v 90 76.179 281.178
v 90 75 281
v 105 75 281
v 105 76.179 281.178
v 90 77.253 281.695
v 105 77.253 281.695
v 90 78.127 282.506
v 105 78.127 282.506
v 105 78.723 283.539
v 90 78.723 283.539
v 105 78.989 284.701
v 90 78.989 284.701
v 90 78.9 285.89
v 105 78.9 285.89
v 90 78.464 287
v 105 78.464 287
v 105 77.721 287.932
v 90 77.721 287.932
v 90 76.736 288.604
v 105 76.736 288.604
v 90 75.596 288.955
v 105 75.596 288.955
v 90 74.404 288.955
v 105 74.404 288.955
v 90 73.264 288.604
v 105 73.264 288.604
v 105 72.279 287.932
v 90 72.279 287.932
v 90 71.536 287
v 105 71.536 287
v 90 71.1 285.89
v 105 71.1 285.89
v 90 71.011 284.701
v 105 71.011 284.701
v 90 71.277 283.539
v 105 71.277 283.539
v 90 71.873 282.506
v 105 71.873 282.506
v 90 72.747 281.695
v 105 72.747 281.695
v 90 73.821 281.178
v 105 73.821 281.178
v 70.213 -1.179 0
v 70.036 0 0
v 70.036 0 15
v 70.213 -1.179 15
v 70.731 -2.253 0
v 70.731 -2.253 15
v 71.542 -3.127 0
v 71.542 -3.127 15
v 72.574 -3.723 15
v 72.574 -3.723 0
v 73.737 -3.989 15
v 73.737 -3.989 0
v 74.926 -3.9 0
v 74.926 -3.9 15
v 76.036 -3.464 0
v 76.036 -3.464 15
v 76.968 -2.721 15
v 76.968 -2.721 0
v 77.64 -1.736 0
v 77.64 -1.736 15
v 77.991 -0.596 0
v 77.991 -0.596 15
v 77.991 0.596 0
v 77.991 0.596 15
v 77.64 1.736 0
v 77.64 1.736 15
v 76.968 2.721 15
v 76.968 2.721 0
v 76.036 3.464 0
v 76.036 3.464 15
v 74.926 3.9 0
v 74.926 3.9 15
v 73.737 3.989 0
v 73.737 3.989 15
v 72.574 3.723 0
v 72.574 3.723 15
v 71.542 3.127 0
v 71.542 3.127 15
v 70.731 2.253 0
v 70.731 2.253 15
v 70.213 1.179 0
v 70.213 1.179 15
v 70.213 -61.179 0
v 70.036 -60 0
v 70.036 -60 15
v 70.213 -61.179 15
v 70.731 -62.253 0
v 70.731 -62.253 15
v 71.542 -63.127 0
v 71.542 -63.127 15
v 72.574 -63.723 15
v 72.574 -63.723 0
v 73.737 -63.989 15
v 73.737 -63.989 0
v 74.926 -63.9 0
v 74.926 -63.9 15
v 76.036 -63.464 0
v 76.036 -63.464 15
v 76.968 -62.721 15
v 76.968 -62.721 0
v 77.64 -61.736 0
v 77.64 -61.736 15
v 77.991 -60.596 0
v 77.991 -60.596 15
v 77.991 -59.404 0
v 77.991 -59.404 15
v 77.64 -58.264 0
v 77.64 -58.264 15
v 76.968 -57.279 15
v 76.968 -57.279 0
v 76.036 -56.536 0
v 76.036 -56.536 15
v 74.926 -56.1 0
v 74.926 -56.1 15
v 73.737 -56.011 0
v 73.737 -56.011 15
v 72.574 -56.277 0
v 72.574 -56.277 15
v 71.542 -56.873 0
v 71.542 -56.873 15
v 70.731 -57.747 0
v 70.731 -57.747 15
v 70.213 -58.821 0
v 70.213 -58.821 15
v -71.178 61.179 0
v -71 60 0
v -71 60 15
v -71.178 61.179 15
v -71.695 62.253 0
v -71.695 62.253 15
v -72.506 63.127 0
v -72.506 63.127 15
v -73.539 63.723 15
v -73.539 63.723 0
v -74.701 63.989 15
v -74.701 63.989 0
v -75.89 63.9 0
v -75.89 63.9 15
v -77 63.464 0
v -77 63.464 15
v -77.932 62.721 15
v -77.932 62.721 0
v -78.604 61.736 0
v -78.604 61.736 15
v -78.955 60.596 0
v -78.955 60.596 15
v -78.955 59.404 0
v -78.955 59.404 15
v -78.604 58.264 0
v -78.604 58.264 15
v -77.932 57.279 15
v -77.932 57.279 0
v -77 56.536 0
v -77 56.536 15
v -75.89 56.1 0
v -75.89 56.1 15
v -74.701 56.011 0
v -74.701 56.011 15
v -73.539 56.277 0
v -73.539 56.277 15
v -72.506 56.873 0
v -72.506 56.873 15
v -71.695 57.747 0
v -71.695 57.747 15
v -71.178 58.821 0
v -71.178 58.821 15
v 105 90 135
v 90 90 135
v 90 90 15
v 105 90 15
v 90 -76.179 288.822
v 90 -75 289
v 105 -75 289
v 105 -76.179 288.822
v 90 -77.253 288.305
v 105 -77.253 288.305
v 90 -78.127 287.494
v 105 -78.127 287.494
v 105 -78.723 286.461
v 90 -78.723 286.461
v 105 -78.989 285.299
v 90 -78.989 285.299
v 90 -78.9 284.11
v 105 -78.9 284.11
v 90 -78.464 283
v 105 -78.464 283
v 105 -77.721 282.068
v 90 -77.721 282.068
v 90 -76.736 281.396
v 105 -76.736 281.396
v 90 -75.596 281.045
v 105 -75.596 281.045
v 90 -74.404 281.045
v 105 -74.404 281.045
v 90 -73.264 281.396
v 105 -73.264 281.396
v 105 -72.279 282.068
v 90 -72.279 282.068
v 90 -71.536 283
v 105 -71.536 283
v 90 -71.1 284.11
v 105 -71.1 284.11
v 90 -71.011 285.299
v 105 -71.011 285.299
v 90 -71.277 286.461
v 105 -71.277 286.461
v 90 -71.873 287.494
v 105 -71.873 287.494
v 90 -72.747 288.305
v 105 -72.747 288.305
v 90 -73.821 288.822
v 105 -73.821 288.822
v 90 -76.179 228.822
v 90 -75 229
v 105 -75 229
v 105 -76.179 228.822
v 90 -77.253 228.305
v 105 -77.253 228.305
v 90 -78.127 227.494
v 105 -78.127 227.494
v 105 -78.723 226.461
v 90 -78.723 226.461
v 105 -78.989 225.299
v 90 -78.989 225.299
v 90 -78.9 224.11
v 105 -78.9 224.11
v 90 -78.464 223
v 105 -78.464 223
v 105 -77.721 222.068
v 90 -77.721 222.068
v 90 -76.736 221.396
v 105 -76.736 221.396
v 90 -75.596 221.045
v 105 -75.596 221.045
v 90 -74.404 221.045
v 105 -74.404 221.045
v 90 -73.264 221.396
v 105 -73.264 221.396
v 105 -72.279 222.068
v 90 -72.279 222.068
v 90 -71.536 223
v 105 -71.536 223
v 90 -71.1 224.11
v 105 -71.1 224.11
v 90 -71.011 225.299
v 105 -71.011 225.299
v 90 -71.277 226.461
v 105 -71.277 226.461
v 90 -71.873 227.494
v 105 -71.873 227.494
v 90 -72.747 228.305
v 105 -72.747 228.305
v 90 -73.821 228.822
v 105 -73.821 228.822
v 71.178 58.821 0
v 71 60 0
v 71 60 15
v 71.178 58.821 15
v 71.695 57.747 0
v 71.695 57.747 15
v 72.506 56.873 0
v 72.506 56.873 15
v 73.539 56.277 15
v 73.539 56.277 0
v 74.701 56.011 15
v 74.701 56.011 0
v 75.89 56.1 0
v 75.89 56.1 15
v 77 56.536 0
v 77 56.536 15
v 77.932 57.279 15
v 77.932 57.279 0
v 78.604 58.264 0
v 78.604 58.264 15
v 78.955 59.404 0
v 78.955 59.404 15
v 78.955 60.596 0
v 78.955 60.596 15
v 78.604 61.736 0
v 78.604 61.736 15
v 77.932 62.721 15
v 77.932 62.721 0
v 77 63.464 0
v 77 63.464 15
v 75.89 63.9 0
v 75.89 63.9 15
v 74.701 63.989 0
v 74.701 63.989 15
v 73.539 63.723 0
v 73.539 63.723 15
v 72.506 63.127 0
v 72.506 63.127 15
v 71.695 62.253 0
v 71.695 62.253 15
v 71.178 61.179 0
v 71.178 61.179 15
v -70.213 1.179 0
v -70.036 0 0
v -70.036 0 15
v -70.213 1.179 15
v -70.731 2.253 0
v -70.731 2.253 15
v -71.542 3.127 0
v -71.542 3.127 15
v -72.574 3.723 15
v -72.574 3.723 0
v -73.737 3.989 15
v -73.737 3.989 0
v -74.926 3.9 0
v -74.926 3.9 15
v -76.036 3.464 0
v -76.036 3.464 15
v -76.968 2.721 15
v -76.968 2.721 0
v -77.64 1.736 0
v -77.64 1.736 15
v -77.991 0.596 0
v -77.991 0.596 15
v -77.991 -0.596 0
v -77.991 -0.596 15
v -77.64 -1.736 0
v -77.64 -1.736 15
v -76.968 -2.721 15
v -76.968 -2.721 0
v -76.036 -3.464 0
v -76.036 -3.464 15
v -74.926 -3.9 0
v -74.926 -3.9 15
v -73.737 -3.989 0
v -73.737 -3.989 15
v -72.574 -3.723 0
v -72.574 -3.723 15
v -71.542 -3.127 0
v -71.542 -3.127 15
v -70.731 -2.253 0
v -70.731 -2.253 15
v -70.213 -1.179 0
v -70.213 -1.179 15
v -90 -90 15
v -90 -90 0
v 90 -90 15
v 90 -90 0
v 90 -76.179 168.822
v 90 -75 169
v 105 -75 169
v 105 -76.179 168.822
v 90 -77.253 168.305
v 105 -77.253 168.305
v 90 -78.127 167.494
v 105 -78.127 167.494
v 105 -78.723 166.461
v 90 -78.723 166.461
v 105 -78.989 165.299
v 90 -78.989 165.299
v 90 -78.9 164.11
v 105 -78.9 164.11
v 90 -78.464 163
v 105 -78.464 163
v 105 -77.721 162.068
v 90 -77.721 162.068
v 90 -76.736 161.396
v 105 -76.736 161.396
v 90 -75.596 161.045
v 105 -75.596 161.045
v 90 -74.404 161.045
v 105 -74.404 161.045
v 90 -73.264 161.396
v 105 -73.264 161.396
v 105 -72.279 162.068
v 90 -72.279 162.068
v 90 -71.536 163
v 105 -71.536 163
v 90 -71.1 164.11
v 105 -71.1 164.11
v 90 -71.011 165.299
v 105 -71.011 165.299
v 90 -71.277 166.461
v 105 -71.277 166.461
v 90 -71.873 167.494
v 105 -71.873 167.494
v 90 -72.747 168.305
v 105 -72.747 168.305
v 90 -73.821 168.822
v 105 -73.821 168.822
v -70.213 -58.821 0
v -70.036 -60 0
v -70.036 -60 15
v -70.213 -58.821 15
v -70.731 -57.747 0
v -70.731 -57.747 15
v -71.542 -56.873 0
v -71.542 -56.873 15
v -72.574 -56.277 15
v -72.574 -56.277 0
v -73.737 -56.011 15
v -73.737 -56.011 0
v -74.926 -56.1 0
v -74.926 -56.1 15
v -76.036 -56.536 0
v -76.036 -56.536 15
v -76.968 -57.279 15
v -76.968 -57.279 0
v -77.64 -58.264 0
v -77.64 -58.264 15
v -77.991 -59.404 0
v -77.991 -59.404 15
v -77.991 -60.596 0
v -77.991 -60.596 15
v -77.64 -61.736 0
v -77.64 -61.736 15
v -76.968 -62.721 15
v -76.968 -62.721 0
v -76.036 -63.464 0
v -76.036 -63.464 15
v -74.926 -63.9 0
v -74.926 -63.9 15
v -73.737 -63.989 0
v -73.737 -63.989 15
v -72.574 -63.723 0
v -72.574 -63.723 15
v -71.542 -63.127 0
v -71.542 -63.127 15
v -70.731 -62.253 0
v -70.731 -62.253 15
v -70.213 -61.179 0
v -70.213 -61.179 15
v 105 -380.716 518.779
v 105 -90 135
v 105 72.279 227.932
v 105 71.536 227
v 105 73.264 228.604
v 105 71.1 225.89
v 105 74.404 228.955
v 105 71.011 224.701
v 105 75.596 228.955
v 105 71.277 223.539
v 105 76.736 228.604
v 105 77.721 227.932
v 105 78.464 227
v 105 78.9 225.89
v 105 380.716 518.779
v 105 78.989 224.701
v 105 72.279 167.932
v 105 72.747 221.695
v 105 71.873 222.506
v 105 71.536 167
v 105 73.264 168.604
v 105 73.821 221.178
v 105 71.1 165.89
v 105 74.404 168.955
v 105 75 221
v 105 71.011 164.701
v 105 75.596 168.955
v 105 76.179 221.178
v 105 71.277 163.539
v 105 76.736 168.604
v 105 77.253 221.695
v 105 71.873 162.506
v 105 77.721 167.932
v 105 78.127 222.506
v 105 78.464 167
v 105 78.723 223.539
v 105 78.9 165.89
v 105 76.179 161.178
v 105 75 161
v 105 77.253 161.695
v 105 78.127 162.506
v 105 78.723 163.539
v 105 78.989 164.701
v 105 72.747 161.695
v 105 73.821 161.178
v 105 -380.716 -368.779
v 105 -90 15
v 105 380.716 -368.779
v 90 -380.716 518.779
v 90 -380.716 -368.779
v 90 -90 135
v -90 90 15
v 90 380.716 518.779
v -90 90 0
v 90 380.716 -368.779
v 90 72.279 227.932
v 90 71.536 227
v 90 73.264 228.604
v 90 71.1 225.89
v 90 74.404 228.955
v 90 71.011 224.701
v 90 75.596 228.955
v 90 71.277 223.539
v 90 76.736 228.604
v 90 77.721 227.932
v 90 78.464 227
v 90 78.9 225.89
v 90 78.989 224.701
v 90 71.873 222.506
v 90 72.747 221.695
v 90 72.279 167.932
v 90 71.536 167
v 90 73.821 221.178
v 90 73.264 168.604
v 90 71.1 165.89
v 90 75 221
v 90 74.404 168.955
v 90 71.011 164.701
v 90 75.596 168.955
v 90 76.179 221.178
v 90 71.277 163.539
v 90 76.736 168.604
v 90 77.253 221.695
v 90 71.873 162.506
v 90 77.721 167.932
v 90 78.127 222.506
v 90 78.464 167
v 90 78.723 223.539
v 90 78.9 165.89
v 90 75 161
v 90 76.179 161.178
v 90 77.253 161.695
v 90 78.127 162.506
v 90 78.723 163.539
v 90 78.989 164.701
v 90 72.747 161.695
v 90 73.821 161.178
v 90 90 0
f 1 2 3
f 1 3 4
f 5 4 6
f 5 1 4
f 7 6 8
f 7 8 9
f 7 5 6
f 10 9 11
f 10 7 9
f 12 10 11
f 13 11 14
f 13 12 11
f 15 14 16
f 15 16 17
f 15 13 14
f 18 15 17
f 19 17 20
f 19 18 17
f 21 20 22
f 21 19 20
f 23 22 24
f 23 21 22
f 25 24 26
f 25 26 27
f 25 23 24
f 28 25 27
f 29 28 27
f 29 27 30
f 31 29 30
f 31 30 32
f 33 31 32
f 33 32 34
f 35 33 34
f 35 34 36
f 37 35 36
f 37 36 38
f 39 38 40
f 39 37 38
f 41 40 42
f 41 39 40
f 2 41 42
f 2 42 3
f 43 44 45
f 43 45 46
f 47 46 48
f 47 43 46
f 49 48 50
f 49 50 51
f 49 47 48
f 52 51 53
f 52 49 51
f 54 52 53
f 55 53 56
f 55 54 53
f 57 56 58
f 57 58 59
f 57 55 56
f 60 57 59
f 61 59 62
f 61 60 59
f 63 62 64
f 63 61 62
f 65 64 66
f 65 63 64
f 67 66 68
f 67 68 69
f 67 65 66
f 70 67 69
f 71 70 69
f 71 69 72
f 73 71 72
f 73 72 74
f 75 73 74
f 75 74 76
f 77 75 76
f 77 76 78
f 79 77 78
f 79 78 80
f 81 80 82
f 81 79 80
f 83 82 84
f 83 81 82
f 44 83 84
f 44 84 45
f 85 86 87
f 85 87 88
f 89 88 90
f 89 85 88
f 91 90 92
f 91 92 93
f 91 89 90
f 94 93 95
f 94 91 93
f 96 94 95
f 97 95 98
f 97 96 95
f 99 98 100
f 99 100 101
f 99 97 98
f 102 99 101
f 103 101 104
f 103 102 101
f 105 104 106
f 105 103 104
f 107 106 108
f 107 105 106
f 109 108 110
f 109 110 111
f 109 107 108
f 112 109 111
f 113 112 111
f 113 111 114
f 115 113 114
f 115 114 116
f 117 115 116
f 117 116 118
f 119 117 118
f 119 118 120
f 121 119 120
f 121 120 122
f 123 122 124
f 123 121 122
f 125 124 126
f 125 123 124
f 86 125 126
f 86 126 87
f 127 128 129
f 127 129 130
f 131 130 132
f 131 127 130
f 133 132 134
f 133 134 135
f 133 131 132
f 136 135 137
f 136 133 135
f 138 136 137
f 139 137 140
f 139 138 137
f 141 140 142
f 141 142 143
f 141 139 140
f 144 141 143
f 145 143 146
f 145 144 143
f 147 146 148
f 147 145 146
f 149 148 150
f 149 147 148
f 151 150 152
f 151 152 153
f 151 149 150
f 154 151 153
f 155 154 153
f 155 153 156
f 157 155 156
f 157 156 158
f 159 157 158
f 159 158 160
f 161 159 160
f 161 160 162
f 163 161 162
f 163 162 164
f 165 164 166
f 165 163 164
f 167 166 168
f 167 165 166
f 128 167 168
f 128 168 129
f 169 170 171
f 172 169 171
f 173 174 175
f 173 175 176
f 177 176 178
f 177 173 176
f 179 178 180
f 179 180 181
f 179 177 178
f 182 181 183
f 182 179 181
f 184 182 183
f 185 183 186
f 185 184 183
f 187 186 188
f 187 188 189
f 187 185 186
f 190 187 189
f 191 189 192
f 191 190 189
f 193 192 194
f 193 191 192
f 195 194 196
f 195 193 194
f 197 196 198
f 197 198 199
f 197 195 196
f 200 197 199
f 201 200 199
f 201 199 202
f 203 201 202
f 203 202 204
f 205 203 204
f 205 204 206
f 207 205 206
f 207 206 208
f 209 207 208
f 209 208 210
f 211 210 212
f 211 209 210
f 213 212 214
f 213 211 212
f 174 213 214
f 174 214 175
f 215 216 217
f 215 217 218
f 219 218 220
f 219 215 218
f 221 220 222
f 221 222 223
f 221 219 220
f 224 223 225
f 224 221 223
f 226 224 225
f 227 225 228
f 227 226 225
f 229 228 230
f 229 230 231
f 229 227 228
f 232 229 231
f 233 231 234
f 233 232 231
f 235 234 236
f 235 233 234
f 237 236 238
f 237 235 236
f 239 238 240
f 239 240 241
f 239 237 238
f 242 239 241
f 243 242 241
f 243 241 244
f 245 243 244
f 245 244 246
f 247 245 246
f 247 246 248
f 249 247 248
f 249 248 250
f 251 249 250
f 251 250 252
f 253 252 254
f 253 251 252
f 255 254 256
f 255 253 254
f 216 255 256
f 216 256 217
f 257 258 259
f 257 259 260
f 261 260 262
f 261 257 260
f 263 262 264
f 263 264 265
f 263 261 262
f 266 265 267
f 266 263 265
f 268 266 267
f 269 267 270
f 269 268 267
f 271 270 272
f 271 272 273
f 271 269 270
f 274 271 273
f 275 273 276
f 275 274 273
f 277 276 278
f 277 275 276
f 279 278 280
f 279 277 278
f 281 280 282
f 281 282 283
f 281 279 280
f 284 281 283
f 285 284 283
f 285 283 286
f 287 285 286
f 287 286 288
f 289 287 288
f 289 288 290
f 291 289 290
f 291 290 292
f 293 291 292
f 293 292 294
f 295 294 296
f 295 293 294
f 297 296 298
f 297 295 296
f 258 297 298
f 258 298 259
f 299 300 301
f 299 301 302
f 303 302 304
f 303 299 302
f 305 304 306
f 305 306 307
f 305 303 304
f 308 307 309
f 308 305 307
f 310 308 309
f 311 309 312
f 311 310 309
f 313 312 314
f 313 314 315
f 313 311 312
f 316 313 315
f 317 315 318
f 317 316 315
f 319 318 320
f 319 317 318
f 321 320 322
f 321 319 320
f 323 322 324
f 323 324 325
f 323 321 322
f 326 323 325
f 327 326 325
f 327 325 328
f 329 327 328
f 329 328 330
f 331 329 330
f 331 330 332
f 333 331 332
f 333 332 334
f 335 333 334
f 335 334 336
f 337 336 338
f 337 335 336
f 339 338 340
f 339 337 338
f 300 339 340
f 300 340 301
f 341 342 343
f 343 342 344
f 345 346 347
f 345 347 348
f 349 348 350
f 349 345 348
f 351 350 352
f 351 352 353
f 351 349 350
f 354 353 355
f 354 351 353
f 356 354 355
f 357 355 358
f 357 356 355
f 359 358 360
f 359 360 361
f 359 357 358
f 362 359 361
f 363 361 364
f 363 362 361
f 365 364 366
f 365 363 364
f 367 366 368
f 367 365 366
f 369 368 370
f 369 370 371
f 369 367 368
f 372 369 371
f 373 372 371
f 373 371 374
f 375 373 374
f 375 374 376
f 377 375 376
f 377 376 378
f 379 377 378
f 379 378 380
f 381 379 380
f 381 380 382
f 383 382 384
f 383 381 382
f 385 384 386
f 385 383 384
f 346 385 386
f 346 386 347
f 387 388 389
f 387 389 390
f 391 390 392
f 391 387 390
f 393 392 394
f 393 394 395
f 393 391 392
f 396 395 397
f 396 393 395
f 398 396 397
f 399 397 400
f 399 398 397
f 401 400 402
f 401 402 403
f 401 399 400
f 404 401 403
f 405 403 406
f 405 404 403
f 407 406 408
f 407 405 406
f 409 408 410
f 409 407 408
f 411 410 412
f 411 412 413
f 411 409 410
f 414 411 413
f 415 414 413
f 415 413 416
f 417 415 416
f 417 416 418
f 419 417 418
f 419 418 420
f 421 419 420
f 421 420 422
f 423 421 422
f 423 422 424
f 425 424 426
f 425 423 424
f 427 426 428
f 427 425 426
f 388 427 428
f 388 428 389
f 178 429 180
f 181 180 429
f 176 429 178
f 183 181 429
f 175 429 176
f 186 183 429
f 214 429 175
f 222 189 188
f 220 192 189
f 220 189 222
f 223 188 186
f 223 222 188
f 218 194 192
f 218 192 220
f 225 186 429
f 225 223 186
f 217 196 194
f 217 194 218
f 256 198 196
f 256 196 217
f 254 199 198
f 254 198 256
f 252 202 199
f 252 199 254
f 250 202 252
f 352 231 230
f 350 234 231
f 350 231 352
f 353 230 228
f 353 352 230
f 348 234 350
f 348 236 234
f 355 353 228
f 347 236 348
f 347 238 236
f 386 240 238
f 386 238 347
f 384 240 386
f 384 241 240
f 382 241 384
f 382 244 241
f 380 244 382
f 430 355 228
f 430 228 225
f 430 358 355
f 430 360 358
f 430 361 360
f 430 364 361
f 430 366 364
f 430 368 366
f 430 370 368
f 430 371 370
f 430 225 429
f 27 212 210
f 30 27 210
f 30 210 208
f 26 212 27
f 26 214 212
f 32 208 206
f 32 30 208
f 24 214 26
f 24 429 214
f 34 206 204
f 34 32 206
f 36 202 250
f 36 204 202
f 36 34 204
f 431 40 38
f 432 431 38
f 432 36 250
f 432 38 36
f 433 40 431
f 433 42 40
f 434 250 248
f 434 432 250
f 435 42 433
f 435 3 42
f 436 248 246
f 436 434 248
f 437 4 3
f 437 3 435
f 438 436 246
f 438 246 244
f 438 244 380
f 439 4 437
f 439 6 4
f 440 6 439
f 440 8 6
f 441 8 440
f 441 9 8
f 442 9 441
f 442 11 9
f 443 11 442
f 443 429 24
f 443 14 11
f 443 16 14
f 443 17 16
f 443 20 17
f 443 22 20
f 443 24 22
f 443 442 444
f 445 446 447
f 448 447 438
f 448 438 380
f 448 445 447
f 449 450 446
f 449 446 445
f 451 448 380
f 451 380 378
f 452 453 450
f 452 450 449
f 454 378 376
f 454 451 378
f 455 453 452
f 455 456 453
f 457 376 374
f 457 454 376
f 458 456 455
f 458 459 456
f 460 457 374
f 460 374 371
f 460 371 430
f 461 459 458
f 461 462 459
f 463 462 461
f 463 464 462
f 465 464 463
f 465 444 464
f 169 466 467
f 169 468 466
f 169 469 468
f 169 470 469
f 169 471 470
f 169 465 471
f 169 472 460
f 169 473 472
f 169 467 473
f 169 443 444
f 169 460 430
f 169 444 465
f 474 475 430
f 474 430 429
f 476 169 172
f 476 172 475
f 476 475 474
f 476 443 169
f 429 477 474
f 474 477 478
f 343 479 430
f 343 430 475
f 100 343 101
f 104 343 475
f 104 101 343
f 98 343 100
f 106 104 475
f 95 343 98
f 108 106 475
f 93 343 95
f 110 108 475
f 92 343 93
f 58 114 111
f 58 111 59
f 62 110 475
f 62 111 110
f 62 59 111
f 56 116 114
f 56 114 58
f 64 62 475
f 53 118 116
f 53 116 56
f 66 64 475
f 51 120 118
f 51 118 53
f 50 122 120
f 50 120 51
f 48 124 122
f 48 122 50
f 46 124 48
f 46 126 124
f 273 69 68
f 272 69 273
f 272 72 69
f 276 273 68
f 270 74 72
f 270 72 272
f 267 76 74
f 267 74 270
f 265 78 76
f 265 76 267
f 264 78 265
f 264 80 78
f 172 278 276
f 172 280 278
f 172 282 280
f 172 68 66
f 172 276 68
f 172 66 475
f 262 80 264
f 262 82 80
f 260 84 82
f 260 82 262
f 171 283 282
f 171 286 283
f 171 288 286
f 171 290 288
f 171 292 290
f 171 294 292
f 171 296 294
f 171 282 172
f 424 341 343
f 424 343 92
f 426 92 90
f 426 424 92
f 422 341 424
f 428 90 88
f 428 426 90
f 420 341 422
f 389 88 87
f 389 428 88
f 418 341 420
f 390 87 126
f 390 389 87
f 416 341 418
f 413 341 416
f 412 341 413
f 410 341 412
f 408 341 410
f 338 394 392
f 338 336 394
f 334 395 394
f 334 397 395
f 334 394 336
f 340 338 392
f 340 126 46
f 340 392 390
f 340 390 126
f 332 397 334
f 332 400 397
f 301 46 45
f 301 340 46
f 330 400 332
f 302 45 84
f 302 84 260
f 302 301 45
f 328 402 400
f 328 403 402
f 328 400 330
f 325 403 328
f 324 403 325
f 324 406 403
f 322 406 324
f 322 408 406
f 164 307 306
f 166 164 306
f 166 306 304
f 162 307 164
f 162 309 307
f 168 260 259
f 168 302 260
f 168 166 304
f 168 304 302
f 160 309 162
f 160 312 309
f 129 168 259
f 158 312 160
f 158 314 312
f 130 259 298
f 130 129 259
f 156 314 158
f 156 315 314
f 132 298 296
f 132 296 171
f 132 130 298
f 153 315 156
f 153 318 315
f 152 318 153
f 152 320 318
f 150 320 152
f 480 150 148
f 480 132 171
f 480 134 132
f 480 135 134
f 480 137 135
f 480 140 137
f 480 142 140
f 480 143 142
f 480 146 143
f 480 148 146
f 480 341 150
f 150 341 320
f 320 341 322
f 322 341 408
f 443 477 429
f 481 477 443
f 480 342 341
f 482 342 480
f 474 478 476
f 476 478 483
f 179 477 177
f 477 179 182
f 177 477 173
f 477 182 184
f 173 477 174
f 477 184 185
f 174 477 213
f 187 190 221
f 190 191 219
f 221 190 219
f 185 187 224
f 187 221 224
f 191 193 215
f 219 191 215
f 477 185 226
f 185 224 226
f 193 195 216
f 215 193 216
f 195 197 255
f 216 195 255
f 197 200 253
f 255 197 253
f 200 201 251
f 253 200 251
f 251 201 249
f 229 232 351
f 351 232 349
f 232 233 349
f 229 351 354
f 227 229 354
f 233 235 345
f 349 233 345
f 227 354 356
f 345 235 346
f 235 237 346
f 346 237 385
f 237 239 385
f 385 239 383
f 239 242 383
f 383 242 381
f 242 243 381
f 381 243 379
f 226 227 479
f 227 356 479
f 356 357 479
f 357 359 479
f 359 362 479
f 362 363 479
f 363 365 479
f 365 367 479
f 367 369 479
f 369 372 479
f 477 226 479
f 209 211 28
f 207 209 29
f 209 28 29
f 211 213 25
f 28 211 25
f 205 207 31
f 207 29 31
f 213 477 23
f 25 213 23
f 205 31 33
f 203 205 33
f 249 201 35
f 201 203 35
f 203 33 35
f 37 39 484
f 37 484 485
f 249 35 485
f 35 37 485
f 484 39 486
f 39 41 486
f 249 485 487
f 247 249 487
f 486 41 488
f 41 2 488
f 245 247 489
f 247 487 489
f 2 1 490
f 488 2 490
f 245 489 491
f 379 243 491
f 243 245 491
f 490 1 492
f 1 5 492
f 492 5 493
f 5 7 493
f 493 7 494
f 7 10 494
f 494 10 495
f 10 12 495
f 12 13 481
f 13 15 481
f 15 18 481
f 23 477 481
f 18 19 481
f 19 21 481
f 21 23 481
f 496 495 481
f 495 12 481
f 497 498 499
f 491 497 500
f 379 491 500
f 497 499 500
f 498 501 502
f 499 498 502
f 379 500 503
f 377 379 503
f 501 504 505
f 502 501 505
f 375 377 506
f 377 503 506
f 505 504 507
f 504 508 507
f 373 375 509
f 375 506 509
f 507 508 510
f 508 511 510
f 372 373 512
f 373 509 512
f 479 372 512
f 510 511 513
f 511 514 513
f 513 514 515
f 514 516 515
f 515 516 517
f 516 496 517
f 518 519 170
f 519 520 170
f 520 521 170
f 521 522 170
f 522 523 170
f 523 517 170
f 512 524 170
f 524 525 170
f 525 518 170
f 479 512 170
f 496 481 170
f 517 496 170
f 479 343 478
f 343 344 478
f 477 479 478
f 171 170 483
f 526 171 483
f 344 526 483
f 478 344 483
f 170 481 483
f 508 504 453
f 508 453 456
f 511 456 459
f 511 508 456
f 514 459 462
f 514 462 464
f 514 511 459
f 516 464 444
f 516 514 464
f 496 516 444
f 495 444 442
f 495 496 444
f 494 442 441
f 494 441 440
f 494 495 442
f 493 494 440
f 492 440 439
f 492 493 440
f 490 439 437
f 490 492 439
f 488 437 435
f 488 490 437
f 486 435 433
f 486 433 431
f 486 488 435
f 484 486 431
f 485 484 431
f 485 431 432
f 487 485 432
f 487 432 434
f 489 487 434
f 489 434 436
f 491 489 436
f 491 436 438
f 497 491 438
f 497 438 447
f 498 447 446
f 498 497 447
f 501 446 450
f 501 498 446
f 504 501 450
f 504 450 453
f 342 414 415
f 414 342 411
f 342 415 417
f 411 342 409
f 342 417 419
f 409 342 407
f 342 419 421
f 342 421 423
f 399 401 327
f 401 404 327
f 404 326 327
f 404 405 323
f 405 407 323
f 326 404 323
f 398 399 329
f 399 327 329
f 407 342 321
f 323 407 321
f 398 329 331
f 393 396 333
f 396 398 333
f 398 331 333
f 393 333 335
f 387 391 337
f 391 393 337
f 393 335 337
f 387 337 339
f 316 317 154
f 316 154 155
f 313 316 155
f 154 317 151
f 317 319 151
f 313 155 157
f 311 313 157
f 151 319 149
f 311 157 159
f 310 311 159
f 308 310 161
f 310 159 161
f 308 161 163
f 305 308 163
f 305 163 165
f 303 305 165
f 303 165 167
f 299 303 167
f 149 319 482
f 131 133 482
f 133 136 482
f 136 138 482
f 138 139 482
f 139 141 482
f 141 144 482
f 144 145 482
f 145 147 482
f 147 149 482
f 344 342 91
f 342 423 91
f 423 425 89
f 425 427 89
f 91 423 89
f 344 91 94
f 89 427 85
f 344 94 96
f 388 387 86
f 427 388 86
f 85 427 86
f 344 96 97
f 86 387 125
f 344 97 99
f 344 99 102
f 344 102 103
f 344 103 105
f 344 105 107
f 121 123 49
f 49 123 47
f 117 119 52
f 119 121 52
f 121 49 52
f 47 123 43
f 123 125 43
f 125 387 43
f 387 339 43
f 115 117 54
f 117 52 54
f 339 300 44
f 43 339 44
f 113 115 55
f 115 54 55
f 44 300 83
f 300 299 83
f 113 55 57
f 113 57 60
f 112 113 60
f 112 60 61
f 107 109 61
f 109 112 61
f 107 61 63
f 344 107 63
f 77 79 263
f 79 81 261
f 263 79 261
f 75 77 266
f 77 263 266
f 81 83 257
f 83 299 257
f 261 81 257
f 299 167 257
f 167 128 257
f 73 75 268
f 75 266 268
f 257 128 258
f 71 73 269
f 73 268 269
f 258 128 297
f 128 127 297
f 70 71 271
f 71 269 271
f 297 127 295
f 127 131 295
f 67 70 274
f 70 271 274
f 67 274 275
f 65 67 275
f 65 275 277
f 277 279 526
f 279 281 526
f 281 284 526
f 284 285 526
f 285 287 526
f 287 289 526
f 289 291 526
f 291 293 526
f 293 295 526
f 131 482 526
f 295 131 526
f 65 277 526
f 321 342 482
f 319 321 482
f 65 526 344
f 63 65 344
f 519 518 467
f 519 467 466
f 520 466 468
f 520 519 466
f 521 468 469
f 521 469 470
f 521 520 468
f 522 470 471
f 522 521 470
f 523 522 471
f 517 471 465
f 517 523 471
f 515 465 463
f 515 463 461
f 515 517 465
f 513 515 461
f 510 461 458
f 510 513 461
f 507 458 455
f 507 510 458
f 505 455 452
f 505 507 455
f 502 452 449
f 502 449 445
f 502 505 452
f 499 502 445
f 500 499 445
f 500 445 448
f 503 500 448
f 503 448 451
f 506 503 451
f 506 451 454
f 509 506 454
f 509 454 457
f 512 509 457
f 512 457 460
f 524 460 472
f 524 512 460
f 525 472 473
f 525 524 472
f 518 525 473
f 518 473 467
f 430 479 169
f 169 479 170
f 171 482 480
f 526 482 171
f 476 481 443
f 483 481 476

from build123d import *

# Parameters (mm, degrees)
SKETCH_1_W      = 180
SKETCH_1_H      = 180
SKETCH_1_R      = 4
EXTRUDE_1_DEPTH = 15
SKETCH_9_W      = 887.558239328
SKETCH_9_H      = 761.432182166
SKETCH_9_R      = 4
SKETCH_9_W_2    = 120
SKETCH_9_H_2    = 180
EXTRUDE_2_DEPTH = 15


with BuildPart() as part:
    # 草图1 → 凸台-拉伸1 (new body)
    with BuildSketch(Plane.XY):
        Rectangle(SKETCH_1_W, SKETCH_1_H)
        with Locations((-75, 60)):
            Circle(SKETCH_1_R, mode=Mode.SUBTRACT)
        with Locations((-74.035625505, 0)):
            Circle(SKETCH_1_R, mode=Mode.SUBTRACT)
        with Locations((-74.035625505, -60)):
            Circle(SKETCH_1_R, mode=Mode.SUBTRACT)
        with Locations(Location((74.035625505, -60, 0), (0, 0, 180))):
            Circle(SKETCH_1_R, mode=Mode.SUBTRACT)
        with Locations(Location((74.035625505, 0, 0), (0, 0, 180))):
            Circle(SKETCH_1_R, mode=Mode.SUBTRACT)
        with Locations(Location((75, 60, 0), (0, 0, 180))):
            Circle(SKETCH_1_R, mode=Mode.SUBTRACT)
    extrude(amount=EXTRUDE_1_DEPTH)

    # 草图9 → 凸台-拉伸2 (add)
    with BuildSketch(Plane(origin=(90, 0, 0), x_dir=(0, 0, -1), z_dir=(1, 0, 0))):
        with Locations((-75, 0)):
            Rectangle(SKETCH_9_W, SKETCH_9_H)
        with Locations((-165, 75)):
            Circle(SKETCH_9_R, mode=Mode.SUBTRACT)
        with Locations((-225, 75)):
            Circle(SKETCH_9_R, mode=Mode.SUBTRACT)
        with Locations((-285, 75)):
            Circle(SKETCH_9_R, mode=Mode.SUBTRACT)
        with Locations(Location((-285, -75, 0), (0, 0, 180))):
            Circle(SKETCH_9_R, mode=Mode.SUBTRACT)
        with Locations(Location((-225, -75, 0), (0, 0, 180))):
            Circle(SKETCH_9_R, mode=Mode.SUBTRACT)
        with Locations(Location((-165, -75, 0), (0, 0, 180))):
            Circle(SKETCH_9_R, mode=Mode.SUBTRACT)
        with Locations((-75, 0)):
            Rectangle(SKETCH_9_W_2, SKETCH_9_H_2, mode=Mode.SUBTRACT)
    extrude(amount=EXTRUDE_2_DEPTH)


solid = part.part
